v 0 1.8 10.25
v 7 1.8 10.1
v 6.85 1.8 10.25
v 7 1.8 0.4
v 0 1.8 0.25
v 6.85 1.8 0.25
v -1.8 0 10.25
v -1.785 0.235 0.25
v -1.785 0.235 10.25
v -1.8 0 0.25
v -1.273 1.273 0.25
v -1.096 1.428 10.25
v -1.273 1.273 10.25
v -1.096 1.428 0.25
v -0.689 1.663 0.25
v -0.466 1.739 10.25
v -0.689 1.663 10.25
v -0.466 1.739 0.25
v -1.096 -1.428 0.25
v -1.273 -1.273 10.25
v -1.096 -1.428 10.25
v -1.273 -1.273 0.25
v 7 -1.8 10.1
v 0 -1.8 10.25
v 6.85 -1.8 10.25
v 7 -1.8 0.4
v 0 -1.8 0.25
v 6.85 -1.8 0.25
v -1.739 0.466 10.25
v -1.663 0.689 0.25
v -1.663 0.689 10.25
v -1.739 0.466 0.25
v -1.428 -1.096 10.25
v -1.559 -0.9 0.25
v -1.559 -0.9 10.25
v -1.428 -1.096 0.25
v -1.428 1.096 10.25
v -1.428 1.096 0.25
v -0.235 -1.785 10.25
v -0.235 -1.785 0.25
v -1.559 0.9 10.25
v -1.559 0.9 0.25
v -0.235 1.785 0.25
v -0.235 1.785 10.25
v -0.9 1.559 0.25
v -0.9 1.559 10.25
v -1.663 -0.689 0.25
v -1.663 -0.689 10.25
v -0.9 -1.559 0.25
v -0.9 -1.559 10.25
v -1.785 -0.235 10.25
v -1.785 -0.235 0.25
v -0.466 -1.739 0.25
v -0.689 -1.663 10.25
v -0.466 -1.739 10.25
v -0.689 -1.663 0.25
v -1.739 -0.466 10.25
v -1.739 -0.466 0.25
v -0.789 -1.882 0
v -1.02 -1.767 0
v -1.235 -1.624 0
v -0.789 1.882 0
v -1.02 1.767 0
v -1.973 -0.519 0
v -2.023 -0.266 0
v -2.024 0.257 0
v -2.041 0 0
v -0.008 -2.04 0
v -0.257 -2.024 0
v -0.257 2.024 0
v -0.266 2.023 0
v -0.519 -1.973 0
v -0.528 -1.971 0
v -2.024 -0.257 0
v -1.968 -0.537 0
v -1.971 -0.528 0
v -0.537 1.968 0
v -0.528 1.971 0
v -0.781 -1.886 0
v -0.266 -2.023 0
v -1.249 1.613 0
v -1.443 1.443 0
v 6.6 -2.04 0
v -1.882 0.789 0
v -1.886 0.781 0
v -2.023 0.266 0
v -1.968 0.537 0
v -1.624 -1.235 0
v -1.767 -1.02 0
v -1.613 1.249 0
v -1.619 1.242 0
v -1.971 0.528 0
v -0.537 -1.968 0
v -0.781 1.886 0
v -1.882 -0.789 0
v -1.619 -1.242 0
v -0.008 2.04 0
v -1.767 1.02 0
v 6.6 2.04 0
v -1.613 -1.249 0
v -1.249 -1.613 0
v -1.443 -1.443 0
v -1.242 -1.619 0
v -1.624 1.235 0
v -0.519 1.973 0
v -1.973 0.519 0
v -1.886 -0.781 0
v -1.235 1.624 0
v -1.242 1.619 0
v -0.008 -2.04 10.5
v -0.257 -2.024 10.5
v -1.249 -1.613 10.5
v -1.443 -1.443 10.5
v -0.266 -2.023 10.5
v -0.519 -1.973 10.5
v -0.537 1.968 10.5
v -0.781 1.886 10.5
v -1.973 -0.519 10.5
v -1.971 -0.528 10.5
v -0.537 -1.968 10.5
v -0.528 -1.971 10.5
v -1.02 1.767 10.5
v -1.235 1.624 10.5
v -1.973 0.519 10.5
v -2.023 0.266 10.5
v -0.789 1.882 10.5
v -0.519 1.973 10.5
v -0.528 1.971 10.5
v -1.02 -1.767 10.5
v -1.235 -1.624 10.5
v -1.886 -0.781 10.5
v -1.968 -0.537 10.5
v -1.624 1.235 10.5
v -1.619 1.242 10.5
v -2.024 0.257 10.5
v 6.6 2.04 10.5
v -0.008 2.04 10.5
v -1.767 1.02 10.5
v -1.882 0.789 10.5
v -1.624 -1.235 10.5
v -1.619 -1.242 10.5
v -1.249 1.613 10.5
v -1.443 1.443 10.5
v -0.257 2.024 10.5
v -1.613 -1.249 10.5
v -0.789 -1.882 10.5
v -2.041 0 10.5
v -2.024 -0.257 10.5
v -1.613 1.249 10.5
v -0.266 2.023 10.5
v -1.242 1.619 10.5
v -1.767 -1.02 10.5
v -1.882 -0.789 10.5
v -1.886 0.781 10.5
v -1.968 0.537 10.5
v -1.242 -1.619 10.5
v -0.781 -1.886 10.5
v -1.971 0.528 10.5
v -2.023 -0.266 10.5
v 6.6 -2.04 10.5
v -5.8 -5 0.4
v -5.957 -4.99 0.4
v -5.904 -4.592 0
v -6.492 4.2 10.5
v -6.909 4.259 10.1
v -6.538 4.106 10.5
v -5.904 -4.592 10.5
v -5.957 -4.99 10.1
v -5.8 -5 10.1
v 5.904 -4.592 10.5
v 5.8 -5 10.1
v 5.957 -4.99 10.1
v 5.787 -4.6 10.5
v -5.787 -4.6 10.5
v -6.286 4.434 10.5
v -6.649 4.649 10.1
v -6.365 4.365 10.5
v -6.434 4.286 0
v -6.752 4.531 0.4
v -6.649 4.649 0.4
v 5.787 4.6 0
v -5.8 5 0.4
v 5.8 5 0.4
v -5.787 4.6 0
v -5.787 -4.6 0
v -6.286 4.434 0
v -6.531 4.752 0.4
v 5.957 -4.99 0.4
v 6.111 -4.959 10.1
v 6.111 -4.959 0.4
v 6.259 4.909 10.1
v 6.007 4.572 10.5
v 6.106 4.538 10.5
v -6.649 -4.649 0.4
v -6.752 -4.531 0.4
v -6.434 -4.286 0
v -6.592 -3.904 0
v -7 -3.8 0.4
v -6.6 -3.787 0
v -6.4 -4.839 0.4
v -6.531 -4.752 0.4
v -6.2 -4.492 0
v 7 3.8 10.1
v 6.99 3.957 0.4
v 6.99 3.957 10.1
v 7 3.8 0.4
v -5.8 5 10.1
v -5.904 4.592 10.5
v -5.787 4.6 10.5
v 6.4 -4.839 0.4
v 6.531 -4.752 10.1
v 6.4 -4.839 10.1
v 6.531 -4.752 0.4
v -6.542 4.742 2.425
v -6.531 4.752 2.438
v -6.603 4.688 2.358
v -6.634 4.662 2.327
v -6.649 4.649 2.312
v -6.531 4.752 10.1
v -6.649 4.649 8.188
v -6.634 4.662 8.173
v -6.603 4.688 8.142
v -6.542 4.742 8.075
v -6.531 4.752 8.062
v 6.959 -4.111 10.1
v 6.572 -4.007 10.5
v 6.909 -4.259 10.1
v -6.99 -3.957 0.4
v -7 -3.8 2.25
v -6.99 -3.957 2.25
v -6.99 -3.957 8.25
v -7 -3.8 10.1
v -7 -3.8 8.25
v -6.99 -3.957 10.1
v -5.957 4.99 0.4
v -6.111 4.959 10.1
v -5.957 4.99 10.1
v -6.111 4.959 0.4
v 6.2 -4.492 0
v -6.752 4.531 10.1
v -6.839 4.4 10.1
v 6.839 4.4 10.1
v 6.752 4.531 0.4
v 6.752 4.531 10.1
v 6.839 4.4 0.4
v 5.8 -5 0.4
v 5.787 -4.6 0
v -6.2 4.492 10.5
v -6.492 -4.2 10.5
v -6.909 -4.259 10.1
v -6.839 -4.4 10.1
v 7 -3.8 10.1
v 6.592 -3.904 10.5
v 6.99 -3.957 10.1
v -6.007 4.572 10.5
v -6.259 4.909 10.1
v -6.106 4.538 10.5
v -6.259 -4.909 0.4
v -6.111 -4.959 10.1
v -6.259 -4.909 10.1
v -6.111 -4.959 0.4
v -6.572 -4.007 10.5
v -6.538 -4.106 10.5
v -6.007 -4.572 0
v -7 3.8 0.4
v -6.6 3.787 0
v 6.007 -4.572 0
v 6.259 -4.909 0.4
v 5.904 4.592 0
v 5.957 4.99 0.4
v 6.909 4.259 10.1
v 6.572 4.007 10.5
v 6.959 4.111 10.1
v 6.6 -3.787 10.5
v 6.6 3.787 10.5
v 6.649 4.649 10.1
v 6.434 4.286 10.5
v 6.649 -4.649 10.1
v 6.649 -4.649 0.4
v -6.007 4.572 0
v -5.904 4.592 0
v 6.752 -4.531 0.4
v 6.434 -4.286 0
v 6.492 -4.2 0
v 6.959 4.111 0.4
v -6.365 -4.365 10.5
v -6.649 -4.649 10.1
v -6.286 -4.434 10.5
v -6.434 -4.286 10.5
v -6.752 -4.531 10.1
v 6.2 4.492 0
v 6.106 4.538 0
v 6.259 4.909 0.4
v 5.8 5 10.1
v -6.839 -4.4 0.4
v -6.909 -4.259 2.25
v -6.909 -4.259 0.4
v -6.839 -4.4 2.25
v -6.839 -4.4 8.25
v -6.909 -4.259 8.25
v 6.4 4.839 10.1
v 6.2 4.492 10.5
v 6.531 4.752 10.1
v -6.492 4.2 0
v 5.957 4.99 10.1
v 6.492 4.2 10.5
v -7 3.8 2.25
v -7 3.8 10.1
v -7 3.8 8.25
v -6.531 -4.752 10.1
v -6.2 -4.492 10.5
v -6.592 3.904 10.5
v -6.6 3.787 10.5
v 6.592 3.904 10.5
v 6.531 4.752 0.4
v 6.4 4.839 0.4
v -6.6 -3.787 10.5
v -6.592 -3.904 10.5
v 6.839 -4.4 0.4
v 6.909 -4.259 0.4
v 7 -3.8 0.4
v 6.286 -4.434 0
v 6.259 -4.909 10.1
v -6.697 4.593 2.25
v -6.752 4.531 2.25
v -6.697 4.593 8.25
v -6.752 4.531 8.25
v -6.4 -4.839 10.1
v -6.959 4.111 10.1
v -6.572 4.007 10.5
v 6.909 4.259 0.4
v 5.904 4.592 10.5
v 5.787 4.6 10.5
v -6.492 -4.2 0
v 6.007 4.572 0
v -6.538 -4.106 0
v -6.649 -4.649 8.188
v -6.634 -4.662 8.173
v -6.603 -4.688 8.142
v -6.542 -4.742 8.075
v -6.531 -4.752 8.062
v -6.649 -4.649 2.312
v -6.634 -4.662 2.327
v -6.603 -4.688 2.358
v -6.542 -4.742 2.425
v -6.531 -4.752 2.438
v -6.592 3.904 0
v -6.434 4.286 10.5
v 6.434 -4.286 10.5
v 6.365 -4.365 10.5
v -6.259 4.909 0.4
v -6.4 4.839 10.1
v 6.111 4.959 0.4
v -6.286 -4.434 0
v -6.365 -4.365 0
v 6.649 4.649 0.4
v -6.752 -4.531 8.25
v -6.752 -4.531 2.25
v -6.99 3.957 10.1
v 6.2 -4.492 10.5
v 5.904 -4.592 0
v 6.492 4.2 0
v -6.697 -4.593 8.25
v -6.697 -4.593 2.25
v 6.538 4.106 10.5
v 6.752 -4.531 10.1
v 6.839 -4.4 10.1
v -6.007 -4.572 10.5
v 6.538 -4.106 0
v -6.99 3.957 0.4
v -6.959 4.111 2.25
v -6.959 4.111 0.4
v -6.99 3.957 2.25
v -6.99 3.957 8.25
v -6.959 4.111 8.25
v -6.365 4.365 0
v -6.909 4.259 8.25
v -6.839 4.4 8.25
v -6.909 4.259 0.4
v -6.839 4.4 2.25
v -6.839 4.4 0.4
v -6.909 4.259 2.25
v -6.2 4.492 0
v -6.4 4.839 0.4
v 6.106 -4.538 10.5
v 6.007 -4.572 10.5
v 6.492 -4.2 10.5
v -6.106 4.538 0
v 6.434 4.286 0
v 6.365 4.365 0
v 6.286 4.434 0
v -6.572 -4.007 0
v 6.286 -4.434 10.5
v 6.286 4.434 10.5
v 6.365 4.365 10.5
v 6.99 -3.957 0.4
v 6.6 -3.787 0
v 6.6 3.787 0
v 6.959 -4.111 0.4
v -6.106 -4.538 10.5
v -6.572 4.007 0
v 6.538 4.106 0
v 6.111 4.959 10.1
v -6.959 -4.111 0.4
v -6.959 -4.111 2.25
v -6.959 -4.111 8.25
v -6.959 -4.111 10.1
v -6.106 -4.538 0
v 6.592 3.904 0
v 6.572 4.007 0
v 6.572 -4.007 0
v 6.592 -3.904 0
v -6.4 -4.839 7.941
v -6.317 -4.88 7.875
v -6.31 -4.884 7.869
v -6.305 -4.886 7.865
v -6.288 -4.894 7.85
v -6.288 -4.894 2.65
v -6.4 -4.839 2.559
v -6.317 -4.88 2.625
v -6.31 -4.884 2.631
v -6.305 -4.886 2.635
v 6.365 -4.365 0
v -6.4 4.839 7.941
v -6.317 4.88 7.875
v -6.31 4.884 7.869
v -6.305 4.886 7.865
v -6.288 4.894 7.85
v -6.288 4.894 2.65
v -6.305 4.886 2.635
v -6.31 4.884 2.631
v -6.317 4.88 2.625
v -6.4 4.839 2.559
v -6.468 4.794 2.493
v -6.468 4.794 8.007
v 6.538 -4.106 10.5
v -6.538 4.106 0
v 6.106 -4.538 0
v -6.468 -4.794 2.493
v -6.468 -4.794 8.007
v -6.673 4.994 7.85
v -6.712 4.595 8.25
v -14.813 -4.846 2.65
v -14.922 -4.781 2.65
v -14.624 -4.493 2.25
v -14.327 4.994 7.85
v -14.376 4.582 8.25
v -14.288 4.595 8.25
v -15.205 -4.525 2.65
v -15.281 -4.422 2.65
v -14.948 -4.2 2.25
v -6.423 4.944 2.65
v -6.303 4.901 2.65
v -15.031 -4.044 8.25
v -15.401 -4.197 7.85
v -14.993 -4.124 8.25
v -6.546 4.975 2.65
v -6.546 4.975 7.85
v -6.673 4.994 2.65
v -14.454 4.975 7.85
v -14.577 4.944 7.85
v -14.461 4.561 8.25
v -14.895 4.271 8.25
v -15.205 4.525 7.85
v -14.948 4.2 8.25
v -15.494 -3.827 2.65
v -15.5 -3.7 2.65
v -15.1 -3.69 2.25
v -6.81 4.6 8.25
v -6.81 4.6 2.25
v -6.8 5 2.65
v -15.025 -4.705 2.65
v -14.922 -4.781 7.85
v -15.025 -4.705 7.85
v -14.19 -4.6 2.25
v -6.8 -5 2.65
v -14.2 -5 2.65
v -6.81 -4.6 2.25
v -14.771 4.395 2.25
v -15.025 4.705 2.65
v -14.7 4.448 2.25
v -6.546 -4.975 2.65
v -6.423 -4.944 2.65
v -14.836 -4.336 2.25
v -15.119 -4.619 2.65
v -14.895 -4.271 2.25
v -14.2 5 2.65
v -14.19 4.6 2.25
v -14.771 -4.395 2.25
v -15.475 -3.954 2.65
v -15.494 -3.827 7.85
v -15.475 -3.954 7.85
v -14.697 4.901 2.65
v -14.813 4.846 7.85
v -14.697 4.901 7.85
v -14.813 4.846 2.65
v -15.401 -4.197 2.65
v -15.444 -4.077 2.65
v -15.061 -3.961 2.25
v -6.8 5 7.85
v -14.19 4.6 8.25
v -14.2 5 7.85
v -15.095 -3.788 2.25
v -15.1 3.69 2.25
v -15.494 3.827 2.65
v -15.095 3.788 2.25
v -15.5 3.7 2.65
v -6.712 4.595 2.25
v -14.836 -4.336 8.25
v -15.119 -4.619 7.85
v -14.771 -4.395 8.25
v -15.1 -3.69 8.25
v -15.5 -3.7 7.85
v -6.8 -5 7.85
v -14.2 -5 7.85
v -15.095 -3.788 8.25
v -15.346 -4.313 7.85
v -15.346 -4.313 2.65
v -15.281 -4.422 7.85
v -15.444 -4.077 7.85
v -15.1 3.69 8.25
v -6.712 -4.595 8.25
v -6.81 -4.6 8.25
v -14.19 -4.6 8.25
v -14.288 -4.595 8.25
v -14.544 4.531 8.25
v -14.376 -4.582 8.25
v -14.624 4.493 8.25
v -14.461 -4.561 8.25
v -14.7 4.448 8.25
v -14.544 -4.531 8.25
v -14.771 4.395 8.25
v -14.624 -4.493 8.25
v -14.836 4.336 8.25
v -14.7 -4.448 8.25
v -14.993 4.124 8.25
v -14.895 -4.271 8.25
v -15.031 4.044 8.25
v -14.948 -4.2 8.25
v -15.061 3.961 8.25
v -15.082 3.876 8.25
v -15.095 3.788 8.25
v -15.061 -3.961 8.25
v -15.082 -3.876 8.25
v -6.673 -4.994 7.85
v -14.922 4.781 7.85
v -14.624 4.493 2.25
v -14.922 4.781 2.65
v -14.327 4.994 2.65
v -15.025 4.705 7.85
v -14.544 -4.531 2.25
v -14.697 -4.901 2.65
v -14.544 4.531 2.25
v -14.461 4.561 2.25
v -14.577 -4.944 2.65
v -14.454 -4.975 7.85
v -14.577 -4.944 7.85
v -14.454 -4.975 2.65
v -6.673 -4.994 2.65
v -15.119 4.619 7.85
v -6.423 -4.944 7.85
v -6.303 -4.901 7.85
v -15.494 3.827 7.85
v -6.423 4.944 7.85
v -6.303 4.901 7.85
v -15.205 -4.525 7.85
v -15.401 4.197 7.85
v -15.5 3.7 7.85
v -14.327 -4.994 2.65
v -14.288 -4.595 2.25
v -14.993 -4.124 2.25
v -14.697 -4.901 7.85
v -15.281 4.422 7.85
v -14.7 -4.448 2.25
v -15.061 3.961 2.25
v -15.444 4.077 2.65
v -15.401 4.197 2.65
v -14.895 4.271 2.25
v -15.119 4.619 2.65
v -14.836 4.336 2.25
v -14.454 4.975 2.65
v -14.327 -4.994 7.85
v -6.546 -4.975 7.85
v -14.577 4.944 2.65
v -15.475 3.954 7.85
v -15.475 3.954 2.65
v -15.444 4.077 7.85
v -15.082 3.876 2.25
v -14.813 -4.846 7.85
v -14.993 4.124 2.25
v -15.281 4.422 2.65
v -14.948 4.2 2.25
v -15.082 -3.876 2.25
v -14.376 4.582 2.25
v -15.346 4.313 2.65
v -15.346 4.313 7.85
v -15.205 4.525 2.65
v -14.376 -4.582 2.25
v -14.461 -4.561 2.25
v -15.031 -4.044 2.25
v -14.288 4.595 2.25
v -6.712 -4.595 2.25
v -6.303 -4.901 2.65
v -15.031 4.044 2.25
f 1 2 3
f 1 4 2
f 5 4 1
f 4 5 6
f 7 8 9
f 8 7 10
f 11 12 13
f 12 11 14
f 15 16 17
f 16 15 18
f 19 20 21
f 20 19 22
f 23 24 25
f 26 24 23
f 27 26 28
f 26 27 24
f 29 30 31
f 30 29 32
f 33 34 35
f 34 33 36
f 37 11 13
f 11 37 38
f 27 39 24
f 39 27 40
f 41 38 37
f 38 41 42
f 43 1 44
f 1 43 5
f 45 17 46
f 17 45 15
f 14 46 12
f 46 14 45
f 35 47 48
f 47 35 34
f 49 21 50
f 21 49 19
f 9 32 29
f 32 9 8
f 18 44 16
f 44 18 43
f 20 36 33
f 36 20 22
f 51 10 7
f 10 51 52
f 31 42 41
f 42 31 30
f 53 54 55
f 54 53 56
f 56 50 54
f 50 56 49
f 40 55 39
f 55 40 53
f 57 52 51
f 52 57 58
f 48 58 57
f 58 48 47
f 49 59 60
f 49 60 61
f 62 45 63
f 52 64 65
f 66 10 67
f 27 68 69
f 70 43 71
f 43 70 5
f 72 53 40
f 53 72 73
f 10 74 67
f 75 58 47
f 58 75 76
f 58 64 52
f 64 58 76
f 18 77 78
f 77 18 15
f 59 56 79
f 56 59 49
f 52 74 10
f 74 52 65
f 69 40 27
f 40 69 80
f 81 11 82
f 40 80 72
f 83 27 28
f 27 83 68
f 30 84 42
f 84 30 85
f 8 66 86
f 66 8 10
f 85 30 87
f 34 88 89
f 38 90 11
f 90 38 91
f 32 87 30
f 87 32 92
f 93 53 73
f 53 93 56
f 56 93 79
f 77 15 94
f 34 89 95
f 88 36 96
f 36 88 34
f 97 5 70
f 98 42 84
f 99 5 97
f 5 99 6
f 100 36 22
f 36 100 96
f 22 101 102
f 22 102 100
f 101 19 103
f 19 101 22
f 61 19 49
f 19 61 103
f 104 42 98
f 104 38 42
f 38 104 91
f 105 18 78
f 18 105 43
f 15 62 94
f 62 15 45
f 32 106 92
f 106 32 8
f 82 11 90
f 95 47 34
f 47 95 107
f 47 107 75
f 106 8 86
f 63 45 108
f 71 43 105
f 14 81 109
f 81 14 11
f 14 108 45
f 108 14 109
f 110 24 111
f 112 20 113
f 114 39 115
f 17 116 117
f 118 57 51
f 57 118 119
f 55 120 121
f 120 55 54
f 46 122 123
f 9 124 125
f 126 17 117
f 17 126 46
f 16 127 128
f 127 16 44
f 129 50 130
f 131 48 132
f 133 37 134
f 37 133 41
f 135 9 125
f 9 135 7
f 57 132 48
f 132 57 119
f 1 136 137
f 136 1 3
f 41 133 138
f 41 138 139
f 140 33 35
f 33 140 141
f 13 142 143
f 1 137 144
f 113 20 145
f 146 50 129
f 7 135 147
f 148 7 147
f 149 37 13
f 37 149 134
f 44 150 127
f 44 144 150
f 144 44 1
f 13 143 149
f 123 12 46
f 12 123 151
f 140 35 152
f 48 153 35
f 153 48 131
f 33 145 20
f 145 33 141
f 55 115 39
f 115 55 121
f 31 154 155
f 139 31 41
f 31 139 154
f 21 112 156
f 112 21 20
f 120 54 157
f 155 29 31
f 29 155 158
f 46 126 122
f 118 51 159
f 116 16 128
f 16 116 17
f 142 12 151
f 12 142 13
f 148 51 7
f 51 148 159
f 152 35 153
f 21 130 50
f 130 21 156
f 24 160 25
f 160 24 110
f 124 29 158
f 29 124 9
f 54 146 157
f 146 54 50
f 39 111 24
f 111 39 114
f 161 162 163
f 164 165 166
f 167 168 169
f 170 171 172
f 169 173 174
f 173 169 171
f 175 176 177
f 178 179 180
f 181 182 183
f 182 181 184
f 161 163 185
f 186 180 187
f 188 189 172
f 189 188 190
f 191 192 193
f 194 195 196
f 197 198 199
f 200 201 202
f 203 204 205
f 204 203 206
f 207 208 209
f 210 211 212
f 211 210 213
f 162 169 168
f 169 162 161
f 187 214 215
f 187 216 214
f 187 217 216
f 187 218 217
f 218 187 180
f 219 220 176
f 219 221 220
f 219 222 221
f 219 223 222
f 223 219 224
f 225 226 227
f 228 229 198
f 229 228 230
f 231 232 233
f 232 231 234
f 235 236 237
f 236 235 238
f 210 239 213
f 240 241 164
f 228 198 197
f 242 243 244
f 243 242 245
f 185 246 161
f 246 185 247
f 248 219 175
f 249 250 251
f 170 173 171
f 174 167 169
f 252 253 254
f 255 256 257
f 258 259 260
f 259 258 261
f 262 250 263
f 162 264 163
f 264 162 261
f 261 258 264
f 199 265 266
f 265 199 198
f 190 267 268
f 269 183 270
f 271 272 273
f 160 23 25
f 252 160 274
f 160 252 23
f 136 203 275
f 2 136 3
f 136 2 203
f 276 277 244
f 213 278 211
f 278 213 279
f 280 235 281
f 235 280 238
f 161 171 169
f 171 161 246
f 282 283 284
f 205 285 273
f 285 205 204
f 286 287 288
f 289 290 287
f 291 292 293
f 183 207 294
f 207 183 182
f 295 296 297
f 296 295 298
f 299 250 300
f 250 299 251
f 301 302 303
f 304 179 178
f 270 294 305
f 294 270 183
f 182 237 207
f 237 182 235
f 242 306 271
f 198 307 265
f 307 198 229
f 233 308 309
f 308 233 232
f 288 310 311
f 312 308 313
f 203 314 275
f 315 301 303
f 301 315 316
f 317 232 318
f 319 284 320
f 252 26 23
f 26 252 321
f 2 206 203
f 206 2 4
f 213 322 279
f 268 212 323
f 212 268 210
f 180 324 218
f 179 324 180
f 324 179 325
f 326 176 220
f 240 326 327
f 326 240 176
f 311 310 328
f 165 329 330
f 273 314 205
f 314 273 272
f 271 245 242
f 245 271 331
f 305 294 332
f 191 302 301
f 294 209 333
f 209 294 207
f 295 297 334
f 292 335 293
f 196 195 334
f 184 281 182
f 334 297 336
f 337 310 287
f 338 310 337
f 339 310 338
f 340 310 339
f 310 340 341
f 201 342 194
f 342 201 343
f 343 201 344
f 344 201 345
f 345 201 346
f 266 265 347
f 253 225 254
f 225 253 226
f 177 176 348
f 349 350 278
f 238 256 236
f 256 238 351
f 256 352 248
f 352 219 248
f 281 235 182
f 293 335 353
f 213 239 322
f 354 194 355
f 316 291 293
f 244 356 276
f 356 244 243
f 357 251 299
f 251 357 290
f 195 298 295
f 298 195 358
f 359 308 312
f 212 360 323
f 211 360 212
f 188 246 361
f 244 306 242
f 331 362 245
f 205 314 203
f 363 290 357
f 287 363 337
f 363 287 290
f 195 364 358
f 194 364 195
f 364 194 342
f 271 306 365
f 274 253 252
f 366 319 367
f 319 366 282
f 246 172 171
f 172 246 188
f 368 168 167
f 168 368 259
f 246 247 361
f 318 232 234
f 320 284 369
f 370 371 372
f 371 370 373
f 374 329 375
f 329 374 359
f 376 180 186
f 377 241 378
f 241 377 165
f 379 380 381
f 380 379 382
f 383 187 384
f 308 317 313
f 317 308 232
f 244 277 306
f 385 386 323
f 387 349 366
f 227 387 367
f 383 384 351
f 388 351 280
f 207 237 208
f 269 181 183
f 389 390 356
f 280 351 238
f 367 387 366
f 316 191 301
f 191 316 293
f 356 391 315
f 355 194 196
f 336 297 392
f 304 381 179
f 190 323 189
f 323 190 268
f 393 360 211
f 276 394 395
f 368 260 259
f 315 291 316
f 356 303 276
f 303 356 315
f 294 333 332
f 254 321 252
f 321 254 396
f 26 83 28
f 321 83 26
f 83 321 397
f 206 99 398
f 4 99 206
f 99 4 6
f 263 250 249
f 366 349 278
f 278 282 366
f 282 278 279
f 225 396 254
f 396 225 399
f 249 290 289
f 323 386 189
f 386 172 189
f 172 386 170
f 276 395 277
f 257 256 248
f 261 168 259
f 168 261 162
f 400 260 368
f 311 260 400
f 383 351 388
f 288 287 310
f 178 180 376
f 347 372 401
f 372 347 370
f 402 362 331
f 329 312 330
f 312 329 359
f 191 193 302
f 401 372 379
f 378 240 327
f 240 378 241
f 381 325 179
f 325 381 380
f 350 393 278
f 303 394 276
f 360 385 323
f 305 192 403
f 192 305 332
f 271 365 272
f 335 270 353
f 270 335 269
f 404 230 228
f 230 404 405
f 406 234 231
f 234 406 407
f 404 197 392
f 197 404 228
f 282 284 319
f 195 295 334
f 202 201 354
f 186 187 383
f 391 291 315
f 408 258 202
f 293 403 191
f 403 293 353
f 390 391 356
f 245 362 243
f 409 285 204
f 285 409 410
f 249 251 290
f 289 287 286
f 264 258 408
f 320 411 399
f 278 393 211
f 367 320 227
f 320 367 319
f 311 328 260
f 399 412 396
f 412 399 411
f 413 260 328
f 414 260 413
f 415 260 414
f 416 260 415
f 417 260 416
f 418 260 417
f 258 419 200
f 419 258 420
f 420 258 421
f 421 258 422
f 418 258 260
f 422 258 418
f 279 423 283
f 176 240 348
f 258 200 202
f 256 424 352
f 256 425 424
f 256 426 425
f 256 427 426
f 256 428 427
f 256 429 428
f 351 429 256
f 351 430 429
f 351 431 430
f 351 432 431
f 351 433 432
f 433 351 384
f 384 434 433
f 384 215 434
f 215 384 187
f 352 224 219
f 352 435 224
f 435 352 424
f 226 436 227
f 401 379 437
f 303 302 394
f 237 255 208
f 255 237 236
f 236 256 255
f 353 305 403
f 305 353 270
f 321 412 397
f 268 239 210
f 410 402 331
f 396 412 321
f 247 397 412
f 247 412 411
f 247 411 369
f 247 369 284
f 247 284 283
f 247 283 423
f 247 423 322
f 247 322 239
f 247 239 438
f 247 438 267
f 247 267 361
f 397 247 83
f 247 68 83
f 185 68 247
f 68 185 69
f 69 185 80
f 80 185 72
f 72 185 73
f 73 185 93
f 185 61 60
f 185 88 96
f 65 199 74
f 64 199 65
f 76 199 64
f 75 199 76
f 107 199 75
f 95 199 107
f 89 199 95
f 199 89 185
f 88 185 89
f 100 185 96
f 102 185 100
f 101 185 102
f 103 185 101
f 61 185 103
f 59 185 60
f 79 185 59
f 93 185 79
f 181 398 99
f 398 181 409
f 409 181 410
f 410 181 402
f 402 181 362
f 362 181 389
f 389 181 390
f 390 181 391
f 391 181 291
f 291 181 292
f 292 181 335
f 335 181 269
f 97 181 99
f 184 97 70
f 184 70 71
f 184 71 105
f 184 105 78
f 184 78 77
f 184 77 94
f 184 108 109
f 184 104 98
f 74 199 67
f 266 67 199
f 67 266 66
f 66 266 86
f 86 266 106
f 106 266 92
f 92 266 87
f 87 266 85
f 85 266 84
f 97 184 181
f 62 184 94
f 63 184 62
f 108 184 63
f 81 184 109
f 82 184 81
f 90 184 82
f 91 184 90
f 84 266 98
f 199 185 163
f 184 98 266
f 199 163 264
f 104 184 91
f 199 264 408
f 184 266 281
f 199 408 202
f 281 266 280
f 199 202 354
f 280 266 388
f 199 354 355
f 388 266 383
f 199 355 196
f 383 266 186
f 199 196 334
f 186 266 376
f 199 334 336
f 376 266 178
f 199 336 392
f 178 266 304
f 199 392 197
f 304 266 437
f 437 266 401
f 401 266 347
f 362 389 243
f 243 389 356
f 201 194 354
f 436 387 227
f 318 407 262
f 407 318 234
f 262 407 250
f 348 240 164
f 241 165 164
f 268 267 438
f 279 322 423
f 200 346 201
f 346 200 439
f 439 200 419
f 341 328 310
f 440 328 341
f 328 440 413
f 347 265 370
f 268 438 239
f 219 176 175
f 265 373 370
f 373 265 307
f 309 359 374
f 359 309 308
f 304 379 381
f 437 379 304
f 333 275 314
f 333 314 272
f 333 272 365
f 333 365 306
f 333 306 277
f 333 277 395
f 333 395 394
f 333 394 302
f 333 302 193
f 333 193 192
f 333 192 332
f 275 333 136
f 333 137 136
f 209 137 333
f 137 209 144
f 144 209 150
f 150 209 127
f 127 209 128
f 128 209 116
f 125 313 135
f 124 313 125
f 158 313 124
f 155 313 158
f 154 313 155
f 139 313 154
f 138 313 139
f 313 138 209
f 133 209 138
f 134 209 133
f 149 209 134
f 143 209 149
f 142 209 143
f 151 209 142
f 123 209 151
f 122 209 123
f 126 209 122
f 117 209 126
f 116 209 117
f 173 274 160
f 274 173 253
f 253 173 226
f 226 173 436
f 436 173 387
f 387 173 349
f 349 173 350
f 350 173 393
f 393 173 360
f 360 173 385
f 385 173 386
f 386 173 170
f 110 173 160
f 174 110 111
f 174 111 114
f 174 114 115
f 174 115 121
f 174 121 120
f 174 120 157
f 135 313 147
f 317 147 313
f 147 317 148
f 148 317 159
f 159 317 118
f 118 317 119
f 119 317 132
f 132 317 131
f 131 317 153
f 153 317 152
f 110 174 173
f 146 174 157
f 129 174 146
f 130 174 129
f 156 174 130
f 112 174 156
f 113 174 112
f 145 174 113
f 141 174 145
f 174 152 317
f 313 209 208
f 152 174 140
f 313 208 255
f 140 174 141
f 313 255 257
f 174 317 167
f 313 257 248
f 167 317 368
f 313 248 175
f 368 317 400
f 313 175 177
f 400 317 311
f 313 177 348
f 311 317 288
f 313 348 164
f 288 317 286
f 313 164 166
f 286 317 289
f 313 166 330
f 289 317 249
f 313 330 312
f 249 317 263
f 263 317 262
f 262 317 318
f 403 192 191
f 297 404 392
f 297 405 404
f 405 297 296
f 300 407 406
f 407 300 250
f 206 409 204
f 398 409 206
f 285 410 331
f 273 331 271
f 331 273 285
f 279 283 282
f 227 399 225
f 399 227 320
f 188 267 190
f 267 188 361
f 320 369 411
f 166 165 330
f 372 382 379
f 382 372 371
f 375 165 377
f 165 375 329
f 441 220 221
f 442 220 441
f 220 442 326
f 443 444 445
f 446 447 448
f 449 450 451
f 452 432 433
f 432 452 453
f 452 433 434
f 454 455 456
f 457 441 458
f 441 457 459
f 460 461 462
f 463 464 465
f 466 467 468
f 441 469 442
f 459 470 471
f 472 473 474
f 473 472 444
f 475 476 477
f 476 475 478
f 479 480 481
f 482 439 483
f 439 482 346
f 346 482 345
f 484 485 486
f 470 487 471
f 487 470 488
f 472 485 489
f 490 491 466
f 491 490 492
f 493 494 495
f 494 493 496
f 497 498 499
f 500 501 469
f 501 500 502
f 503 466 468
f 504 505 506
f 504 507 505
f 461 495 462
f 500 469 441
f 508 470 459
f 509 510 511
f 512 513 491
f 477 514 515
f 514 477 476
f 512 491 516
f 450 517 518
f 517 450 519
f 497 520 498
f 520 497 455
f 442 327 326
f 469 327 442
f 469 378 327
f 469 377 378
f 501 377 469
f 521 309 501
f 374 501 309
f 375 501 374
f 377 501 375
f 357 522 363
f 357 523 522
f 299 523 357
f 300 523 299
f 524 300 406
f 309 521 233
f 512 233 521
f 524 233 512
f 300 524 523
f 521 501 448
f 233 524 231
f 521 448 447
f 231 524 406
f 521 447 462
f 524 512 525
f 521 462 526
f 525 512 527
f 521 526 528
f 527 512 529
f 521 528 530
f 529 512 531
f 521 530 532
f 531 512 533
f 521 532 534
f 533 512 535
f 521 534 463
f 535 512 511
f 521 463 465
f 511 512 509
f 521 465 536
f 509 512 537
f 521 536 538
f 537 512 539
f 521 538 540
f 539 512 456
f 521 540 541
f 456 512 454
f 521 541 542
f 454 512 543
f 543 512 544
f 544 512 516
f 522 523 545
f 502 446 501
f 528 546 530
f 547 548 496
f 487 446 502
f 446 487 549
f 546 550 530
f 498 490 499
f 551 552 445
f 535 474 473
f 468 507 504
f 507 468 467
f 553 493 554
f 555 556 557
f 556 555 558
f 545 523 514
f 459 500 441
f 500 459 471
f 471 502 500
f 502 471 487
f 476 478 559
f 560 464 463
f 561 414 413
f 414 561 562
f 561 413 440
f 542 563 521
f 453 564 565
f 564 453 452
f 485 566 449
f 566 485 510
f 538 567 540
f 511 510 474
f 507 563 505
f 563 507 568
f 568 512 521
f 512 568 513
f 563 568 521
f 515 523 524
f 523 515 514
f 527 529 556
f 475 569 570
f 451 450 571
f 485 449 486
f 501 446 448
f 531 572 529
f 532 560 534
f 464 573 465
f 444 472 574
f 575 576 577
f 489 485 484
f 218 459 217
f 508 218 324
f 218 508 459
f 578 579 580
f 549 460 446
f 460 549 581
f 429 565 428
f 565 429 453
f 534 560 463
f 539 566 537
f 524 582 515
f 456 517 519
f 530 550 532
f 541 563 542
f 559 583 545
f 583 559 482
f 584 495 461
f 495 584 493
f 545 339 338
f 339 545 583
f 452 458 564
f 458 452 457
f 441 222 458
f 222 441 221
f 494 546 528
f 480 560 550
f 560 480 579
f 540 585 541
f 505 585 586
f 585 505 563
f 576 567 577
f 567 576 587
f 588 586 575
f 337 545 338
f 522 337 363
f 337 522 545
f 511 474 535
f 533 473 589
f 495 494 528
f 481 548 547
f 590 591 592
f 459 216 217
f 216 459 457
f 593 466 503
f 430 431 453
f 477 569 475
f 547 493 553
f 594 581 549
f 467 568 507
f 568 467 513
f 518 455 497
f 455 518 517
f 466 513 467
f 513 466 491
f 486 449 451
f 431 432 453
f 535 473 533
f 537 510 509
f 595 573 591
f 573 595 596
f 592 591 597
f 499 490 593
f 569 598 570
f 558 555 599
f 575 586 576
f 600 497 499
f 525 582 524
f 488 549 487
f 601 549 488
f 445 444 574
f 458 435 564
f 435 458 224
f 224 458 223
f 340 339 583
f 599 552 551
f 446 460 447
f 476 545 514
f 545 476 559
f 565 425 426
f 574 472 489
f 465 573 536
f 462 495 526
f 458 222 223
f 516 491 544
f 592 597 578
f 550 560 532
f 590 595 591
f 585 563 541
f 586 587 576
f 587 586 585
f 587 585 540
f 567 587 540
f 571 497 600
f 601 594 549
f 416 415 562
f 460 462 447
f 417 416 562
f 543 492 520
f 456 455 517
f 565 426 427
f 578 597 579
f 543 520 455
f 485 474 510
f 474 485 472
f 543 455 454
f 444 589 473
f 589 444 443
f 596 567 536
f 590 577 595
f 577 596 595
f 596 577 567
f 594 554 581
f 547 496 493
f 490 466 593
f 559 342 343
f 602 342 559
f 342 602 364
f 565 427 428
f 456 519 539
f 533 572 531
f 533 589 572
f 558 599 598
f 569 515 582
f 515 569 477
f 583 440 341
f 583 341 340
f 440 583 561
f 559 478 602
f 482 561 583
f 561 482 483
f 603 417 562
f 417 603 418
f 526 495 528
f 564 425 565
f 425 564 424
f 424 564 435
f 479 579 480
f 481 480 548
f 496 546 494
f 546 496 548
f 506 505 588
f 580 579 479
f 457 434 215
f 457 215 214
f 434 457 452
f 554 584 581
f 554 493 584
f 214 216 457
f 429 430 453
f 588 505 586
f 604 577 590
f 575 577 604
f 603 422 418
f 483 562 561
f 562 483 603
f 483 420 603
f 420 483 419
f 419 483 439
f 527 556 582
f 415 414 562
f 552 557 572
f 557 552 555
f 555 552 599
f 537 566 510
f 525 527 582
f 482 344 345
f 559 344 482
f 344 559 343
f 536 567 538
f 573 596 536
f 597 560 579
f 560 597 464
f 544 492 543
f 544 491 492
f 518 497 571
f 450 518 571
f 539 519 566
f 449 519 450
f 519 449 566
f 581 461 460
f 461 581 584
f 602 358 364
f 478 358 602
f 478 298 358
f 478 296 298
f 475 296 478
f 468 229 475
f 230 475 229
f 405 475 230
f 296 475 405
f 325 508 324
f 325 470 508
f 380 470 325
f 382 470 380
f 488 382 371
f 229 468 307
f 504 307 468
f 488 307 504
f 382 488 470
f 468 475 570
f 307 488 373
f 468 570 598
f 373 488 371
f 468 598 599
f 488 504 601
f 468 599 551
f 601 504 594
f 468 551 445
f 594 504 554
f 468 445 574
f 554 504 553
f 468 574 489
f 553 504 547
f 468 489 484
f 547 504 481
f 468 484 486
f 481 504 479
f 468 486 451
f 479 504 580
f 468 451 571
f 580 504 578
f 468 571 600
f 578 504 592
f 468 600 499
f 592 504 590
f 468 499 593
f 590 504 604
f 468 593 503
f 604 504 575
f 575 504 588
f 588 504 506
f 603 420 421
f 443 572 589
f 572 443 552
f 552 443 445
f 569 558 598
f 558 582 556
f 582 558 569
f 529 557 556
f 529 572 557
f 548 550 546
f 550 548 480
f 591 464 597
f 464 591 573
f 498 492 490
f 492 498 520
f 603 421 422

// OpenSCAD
// file: ../../../../../scad/lib/edge_finished_profiles.scad
// Local positive primitives are finished before functional cuts.
use <util.scad>
module ef_round_rect(w,l,r) {
    safe_r=min(r,w/2-0.01,l/2-0.01);
    translate([-w/2,-l/2]) projection(cut=true) rrect_prism(w,l,1,safe_r);
}
module ef_capsule(w,l) {
    assert(l>=w && w>0);
    hull() for(s=[-1,1]) translate([0,s*(l-w)/2]) circle(d=w,$fn=48);
}
module ef_profile(t,c=0.6) {
    // Compensated local profile, exact extrema and thickness. This is not a
    // blanket Minkowski of a completed part or assembly. Cuts are restored last.
    assert(t>2*c && c>0);
    minkowski() {
        translate([0,0,c]) linear_extrude(t-2*c) offset(delta=-c) children();
        union() {
            translate([0,0,-c]) cylinder(r1=0,r2=c,h=c,$fn=16);
            cylinder(r1=c,r2=0,h=c,$fn=16);
        }
    }
}
module ef_convex_profile(t,c=0.6) {
    // Exact offset loft for convex profiles: avoids unnecessary 3D Minkowski
    // triangulation on large plates and bosses. Nonconvex profiles use ef_profile.
    assert(t>2*c && c>0);
    hull() {
        linear_extrude(0.01) offset(delta=-c) children();
        translate([0,0,c]) linear_extrude(t-2*c) children();
        translate([0,0,t-0.01]) linear_extrude(0.01) offset(delta=-c) children();
    }
}
module ef_cut(t,c=0.6) {
    translate([0,0,-0.1]) linear_extrude(t+0.2) children();
    hull() {
        translate([0,0,-0.01]) linear_extrude(0.01) offset(delta=c) children();
        translate([0,0,c]) linear_extrude(0.01) children();
    }
    hull() {
        translate([0,0,t-c-0.01]) linear_extrude(0.01) children();
        translate([0,0,t]) linear_extrude(0.01) offset(delta=c) children();
    }
}
module ef_bore(d,t,c=0.3) { ef_cut(t,c) circle(d=d,$fn=32); }
// Diameter is the inscribed circle: polygon flats preserve the shaft clearance.
module ef_poly_bore(d,t,c=0.3,sides=8) {
    assert(sides>=6 && sides==floor(sides));
    ef_cut(t,c) rotate(180/sides) circle(r=d/2/cos(180/sides),$fn=sides);
}
module ef_box(w,l,t,r=2,c=0.6) { ef_convex_profile(t,c) ef_round_rect(w,l,r); }
module ef_hex(af) { rotate(30) circle(d=af/cos(30),$fn=6); }
module ef_plan_finish(r=2) {
    // Closing rounds concave roots; opening rounds convex corners. Exact planar
    // extrema and straight functional flats are retained.
    offset(r=r) offset(delta=-r) offset(delta=-r) offset(r=r) children();
}
module ef_root(w,l,r=1,corner=2) {
    // Local 45-degree relief where a boss meets a plate (place at plate top).
    hull() {
        linear_extrude(0.01) ef_round_rect(w+2*r,l+2*r,corner+r);
        // End strictly inside the boss. An exact tangent match of the two
        // independently tessellated rounded profiles creates microscopic lips.
        translate([0,0,r+0.3]) linear_extrude(0.01)
            offset(delta=-0.3) ef_round_rect(w,l,corner);
    }
}
// file: ../../../../../scad/lib/camera_rotary_joint.scad
// Camera-only rotary joint, mm. Legacy light quick-release remains untouched.
// Female assembled face z=18.5; male face z=6. Male is flipped onto female.
use <../../parts/common/jigs/quick_release_prototypes/quick_release_prototypes.scad>
use <edge_finished_profiles.scad>
$fn=48;
camera_qr_ear_center=52;
camera_qr_ear_width=10;
camera_qr_ear_inner=12;
camera_qr_ear_end=57;
camera_qr_ear_chamfer=.4;
camera_qr_screw_clearance=3.5;
camera_qr_nut_af=5.8;
camera_qr_nut_bottom=2;
camera_qr_nut_top=4.8;
camera_qr_screw_bottom=.5;
module camera_qr_ear(z,h,s) {
 translate([0,s*(camera_qr_ear_inner+camera_qr_ear_end)/2,z])
  ef_box(camera_qr_ear_width,camera_qr_ear_end-camera_qr_ear_inner,h,2,camera_qr_ear_chamfer);
}
// Round concave joins of the ears to the existing pad. The inner exclusion
// protects mating surfaces. 0.1 mm overlap avoids coincident boolean faces.
module camera_qr_roots(foot_width,z,h,round_foot=false) {
 difference() {
  translate([0,0,z]) ef_profile(h,.3) ef_plan_finish(1) union() {
   if(round_foot) circle(d=foot_width,$fn=64);
   else ef_round_rect(foot_width,foot_width,3);
   for(s=[-1,1])
    translate([0,s*(camera_qr_ear_inner+camera_qr_ear_end)/2])
     ef_round_rect(camera_qr_ear_width,camera_qr_ear_end-camera_qr_ear_inner,2);
  }
  translate([0,0,z-.1]) linear_extrude(h+.2)
   if(round_foot) circle(d=foot_width-.2,$fn=64);
   else ef_round_rect(foot_width-.2,foot_width-.2,2.9);
 }
}
module camera_qr_female_cuts() {
 for(s=[-1,1]) {
  translate([0,s*camera_qr_ear_center,camera_qr_screw_bottom])
   ef_poly_bore(camera_qr_screw_clearance,8-camera_qr_screw_bottom+.02,.25,8);
  // Allow a fully unthreaded shank to slide outward; retain hex shoulders.
  translate([0,0,4.92]) ef_cut(3.2,.15) hull() {
   translate([0,s*camera_qr_ear_center]) circle(d=3.6,$fn=48);
   translate([0,s*(camera_qr_ear_end+1)]) circle(d=3.6,$fn=48);
  }
  translate([0,s*camera_qr_ear_center,camera_qr_nut_bottom+.1])
   ef_cut(camera_qr_nut_top-camera_qr_nut_bottom-.2,.2)
    hull() {
     ef_hex(camera_qr_nut_af);
     translate([0,s*7]) square([camera_qr_nut_af,1],center=true);
    }
 }
}
module camera_qr_female() {
 difference() {
  union() {
   twist_female();
   for(s=[-1,1]) camera_qr_ear(0,8,s);
   camera_qr_roots(28,0,8,true);
   // Raise the annular land 0.5 mm to preserve the existing z=24.5
   // camera datum. Entry slots must remain open through the raised land.
   difference() {
    translate([0,0,17.98]) cylinder(d=28,h=.52);
    translate([0,0,17.97]) cylinder(d=14.6,h=.55);
    for(a=[80,260]) rotate([0,0,a])
     translate([0,-3.3,17.97]) cube([10.8,6.6,.55]);
   }
  }
  camera_qr_female_cuts();
 }
}
module camera_qr_male() {
 difference() {
  union() {
   twist_male();
   camera_qr_roots(40,0,6);
   camera_qr_roots(60,-6,6);
   for(s=[-1,1]) {
    camera_qr_ear(-6,12,s);
    // Fill old rubber recesses; rigid lands carry the clamping force.
    translate([s*10.5,0,5.7]) cube([5.5,8.5,.6],center=true);
   }
  }
  for(s=[-1,1]) translate([0,0,-6.01])
   ef_cut(12.02,.25) hull() {
    translate([0,s*camera_qr_ear_center]) circle(d=3.6,$fn=48);
    translate([0,s*(camera_qr_ear_end+1)]) circle(d=3.6,$fn=48);
   }
  // Clearance beneath lug bearing faces permits the rigid faces to close:
  // legacy nominal gap 0.5 mm plus 0.3 mm clearance; preserve 2.2 mm lug.
  difference() {
   translate([0,0,10.99]) cylinder(d=24,h=.81);
   translate([0,0,10.98]) cylinder(d=14,h=.85);
  }
 }
}

// Removable slotted spacer; open slot faces +X for both sides.
module camera_qr_spacer() {
 difference() {
  ef_box(14,10,10.5,1.2,.4);
  translate([0,0,-.01]) ef_cut(10.52,.25)
   hull() { circle(d=3.6,$fn=48); translate([8,0]) circle(d=3.6,$fn=48); }
 }
}
// main file
// Removable U spacer plus fingertip tab; uses canonical mating spacer.
use <../../../../../scad/lib/camera_rotary_joint.scad>
use <../../../../../scad/lib/edge_finished_profiles.scad>
module camera_hand_spacer() {
 union() {
  camera_qr_spacer();
  translate([-10.5,0,2.25]) ef_box(10,10,6,1.3,.4);
 }
}
camera_hand_spacer();
